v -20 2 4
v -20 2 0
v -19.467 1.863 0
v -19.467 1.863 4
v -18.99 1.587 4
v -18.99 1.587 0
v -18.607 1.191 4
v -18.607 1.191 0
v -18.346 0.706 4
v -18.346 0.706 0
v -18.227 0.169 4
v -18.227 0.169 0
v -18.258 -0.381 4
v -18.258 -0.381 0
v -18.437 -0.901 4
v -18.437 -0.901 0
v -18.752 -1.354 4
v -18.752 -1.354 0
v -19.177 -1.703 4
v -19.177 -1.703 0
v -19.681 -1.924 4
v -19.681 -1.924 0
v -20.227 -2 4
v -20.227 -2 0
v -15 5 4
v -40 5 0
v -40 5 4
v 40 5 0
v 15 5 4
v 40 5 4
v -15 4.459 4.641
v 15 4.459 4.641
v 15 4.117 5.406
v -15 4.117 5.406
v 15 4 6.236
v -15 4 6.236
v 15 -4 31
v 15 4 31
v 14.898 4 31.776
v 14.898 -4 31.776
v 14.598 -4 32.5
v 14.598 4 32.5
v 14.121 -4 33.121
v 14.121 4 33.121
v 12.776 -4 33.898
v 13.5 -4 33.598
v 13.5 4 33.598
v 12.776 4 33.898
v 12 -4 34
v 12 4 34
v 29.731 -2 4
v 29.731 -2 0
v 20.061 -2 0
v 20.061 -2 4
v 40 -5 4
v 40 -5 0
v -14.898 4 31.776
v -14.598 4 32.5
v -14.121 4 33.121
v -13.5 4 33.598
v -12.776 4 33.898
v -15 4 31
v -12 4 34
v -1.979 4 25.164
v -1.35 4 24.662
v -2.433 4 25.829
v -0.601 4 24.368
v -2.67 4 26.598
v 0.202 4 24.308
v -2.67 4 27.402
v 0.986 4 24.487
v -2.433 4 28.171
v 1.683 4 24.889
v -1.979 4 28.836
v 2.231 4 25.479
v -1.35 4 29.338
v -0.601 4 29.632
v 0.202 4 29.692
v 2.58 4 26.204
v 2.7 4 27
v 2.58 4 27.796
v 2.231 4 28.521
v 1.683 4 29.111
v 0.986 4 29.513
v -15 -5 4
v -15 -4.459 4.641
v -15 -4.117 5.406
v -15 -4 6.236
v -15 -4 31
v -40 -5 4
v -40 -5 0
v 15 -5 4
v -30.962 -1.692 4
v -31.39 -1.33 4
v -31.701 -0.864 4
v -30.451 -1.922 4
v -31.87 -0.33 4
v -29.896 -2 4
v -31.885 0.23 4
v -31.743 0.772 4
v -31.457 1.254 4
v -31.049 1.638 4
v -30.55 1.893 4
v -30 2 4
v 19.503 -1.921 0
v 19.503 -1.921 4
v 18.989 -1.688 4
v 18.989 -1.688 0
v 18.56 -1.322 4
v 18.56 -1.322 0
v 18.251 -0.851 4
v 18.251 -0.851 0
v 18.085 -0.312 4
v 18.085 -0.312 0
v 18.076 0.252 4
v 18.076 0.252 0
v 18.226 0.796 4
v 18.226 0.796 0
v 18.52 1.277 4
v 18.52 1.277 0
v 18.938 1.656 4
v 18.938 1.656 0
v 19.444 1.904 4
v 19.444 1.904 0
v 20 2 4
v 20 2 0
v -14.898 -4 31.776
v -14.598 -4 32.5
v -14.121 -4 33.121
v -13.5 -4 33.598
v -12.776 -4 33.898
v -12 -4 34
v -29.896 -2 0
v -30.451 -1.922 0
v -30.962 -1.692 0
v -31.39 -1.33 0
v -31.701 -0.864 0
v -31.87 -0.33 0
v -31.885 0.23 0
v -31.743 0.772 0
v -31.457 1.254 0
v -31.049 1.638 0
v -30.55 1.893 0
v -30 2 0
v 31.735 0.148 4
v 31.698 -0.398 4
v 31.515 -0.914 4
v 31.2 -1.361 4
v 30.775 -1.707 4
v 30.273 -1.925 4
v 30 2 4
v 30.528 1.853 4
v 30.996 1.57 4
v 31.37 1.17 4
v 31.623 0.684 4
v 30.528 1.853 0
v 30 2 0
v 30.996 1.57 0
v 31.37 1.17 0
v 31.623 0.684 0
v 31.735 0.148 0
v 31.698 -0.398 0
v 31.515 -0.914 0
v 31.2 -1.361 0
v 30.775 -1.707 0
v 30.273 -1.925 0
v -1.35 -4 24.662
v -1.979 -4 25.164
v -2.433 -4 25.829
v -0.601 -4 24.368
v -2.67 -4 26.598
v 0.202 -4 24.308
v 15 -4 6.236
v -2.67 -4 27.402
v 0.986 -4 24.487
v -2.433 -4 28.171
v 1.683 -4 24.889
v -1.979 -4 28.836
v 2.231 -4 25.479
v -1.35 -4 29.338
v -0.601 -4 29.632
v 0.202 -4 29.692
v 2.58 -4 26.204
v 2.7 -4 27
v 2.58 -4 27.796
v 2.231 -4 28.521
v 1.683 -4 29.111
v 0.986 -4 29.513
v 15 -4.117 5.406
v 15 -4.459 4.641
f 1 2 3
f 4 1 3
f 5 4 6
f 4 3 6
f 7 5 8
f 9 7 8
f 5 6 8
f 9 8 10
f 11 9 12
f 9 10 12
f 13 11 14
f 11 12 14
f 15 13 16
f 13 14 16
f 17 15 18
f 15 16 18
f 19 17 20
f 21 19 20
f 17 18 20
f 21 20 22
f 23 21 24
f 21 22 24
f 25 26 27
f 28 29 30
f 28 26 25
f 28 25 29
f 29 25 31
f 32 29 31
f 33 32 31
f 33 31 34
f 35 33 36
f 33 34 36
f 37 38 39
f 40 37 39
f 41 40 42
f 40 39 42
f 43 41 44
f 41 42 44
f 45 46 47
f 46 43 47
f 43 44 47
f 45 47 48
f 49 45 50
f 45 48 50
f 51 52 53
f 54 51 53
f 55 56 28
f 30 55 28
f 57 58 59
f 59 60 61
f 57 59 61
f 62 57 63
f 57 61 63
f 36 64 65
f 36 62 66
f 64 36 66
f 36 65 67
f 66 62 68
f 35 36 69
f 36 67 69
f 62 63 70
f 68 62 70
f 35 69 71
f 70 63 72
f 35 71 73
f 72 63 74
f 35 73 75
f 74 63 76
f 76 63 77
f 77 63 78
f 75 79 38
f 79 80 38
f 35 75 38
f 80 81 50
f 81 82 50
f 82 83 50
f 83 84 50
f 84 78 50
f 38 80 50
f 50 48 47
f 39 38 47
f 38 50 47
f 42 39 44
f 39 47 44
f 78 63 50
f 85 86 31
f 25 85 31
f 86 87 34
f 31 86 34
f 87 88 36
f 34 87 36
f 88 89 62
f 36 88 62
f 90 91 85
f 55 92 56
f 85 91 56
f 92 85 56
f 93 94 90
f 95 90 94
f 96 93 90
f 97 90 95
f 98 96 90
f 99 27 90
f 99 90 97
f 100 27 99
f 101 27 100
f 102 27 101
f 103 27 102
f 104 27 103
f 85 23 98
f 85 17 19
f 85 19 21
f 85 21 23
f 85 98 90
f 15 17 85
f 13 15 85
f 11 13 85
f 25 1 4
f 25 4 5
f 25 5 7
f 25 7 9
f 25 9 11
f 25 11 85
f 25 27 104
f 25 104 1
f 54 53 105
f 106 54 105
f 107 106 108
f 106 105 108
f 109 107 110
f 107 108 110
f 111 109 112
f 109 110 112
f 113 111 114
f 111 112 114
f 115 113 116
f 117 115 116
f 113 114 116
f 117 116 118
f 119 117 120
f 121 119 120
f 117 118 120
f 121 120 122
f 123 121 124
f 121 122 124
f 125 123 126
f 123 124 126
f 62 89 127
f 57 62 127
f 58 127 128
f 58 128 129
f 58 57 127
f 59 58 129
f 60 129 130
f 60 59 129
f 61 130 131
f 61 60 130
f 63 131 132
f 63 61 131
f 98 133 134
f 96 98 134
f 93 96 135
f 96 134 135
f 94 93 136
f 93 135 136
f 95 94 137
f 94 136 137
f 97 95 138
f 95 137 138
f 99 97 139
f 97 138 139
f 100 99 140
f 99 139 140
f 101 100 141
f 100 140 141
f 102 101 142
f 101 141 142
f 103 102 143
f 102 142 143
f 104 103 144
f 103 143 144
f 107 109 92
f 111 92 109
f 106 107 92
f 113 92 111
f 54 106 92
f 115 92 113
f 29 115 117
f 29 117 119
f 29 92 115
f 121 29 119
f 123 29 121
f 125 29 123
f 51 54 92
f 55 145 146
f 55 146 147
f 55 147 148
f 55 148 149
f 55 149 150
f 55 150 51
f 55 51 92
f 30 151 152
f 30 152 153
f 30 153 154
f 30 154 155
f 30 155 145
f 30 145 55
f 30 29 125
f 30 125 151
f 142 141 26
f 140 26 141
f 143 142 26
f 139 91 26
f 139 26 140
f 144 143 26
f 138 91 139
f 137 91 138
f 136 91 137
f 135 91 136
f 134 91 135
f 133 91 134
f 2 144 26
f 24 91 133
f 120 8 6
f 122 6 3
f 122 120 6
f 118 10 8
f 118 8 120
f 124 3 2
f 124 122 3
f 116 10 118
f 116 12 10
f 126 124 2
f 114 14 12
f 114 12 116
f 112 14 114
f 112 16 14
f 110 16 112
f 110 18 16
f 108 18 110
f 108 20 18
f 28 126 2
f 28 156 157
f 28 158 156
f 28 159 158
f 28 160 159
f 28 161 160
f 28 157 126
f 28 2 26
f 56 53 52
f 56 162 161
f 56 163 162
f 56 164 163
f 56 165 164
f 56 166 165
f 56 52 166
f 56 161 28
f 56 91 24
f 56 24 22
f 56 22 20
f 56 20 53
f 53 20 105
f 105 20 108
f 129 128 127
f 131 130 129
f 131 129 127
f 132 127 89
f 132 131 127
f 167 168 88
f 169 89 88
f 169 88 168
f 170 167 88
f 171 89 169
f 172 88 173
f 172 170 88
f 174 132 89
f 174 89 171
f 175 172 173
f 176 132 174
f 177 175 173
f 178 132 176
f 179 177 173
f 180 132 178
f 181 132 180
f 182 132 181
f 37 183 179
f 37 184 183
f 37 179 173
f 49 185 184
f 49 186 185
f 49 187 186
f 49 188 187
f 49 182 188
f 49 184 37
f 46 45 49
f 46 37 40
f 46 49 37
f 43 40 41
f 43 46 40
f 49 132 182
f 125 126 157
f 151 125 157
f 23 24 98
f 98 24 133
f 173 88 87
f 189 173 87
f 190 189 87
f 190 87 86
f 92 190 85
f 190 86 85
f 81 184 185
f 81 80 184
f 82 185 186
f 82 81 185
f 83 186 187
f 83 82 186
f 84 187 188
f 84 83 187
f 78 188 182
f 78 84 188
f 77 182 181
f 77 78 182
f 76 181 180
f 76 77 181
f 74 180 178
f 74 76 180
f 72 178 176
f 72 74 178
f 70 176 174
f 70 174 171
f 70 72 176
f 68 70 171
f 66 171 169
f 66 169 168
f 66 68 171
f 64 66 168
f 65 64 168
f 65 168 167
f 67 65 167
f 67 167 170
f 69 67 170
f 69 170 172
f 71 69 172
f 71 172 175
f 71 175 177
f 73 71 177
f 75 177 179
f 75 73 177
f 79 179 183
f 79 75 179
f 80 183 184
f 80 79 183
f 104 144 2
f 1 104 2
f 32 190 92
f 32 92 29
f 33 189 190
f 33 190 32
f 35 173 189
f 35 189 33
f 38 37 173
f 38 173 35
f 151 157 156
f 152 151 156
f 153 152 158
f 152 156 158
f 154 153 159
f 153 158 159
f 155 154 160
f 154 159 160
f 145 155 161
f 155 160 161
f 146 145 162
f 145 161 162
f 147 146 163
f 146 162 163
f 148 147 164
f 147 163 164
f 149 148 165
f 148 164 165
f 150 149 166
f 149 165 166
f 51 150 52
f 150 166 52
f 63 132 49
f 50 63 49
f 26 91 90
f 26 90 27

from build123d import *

# Parameters (mm, degrees)
F0_W        = 80
F0_H        = 10
F2_DEPTH    = 4
F1_W        = 30
F1_H        = 34
F1_R        = 2.7
F3_DEPTH    = 4
F4_T1_DEPTH = 30
F4_T3_DEPTH = 30
F4_T5_DEPTH = 23
F4_T7_DEPTH = 23


# Not quite as in the source:
# - a fillet or chamfer that OpenCascade refuses, or shapes differently, is made with other operations: its cross-section is extruded or revolved along the edge and cut away or added


with BuildPart() as f2:
    # F0 (on Top) → F2 (new body)
    with BuildSketch(Plane.XY):
        Rectangle(F0_W, F0_H)
        with BuildLine():
            ThreePointArc((-29.8963663541, -2.000000095), (-31.8970374873, -0.0504918144), (-30, 1.999999905))
            Line((-30, 1.999999905), (-20, 1.999999905))
            ThreePointArc((-20, 1.999999905), (-18.2234549617, -0.1070915702), (-20.226663407, -2.000000095))
            Line((-20.226663407, -2.000000095), (-29.8963663541, -2.000000095))
        make_face(mode=Mode.SUBTRACT)
        with BuildLine():
            ThreePointArc((20.0609671511, -2.000000095), (18.0607348524, -0.030022587), (20, 1.999999905))
            Line((20, 1.999999905), (30, 1.999999905))
            ThreePointArc((30, 1.999999905), (31.7352004336, -0.1259018267), (29.7306719608, -2.000000095))
            Line((29.7306719608, -2.000000095), (20.0609671511, -2.000000095))
        make_face(mode=Mode.SUBTRACT)
    extrude(amount=F2_DEPTH)

    # F1 (on Front) → F3 (join, symmetric)
    with BuildSketch(Plane.XZ):
        with Locations((0, 17)):
            Rectangle(F1_W, F1_H)
        with Locations((0, 27)):
            Circle(F1_R, mode=Mode.SUBTRACT)
    extrude(amount=F3_DEPTH, both=True)

    # F4: fillet of radius 3 on 4 edges, made by hand

    # F4_s2 → F4_t1 (join)
    with BuildSketch(Plane.YZ.offset(-15)):
        with BuildLine():
            ThreePointArc((5, 4), (4.2613872125, 5.0113231061), (4, 6.2360679775))
            Line((4, 6.2360679775), (4, 4))
            Line((4, 4), (5, 4))
        make_face()
    extrude(amount=F4_T1_DEPTH)

    # F4_s4 → F4_t3 (join)
    with BuildSketch(Plane.YZ.offset(-15)):
        with BuildLine():
            ThreePointArc((-4, 6.2360679775), (-4.2613872125, 5.0113231061), (-5, 4))
            Line((-5, 4), (-4, 4))
            Line((-4, 4), (-4, 6.2360679775))
        make_face()
    extrude(amount=F4_T3_DEPTH)

    # F4_s6 → F4_t5 (cut)
    with BuildSketch(Plane.XZ.offset(-11.5)):
        with BuildLine():
            ThreePointArc((15, 31), (14.1213203436, 33.1213203436), (12, 34))
            Line((12, 34), (15, 34))
            Line((15, 34), (15, 31))
        make_face()
    extrude(amount=F4_T5_DEPTH, mode=Mode.SUBTRACT)

    # F4_s8 → F4_t7 (cut)
    with BuildSketch(Plane.XZ.offset(-11.5)):
        with BuildLine():
            ThreePointArc((-15, 31), (-14.1213203436, 33.1213203436), (-12, 34))
            Line((-12, 34), (-15, 34))
            Line((-15, 34), (-15, 31))
        make_face()
    extrude(amount=F4_T7_DEPTH, mode=Mode.SUBTRACT)


solid = f2.part
